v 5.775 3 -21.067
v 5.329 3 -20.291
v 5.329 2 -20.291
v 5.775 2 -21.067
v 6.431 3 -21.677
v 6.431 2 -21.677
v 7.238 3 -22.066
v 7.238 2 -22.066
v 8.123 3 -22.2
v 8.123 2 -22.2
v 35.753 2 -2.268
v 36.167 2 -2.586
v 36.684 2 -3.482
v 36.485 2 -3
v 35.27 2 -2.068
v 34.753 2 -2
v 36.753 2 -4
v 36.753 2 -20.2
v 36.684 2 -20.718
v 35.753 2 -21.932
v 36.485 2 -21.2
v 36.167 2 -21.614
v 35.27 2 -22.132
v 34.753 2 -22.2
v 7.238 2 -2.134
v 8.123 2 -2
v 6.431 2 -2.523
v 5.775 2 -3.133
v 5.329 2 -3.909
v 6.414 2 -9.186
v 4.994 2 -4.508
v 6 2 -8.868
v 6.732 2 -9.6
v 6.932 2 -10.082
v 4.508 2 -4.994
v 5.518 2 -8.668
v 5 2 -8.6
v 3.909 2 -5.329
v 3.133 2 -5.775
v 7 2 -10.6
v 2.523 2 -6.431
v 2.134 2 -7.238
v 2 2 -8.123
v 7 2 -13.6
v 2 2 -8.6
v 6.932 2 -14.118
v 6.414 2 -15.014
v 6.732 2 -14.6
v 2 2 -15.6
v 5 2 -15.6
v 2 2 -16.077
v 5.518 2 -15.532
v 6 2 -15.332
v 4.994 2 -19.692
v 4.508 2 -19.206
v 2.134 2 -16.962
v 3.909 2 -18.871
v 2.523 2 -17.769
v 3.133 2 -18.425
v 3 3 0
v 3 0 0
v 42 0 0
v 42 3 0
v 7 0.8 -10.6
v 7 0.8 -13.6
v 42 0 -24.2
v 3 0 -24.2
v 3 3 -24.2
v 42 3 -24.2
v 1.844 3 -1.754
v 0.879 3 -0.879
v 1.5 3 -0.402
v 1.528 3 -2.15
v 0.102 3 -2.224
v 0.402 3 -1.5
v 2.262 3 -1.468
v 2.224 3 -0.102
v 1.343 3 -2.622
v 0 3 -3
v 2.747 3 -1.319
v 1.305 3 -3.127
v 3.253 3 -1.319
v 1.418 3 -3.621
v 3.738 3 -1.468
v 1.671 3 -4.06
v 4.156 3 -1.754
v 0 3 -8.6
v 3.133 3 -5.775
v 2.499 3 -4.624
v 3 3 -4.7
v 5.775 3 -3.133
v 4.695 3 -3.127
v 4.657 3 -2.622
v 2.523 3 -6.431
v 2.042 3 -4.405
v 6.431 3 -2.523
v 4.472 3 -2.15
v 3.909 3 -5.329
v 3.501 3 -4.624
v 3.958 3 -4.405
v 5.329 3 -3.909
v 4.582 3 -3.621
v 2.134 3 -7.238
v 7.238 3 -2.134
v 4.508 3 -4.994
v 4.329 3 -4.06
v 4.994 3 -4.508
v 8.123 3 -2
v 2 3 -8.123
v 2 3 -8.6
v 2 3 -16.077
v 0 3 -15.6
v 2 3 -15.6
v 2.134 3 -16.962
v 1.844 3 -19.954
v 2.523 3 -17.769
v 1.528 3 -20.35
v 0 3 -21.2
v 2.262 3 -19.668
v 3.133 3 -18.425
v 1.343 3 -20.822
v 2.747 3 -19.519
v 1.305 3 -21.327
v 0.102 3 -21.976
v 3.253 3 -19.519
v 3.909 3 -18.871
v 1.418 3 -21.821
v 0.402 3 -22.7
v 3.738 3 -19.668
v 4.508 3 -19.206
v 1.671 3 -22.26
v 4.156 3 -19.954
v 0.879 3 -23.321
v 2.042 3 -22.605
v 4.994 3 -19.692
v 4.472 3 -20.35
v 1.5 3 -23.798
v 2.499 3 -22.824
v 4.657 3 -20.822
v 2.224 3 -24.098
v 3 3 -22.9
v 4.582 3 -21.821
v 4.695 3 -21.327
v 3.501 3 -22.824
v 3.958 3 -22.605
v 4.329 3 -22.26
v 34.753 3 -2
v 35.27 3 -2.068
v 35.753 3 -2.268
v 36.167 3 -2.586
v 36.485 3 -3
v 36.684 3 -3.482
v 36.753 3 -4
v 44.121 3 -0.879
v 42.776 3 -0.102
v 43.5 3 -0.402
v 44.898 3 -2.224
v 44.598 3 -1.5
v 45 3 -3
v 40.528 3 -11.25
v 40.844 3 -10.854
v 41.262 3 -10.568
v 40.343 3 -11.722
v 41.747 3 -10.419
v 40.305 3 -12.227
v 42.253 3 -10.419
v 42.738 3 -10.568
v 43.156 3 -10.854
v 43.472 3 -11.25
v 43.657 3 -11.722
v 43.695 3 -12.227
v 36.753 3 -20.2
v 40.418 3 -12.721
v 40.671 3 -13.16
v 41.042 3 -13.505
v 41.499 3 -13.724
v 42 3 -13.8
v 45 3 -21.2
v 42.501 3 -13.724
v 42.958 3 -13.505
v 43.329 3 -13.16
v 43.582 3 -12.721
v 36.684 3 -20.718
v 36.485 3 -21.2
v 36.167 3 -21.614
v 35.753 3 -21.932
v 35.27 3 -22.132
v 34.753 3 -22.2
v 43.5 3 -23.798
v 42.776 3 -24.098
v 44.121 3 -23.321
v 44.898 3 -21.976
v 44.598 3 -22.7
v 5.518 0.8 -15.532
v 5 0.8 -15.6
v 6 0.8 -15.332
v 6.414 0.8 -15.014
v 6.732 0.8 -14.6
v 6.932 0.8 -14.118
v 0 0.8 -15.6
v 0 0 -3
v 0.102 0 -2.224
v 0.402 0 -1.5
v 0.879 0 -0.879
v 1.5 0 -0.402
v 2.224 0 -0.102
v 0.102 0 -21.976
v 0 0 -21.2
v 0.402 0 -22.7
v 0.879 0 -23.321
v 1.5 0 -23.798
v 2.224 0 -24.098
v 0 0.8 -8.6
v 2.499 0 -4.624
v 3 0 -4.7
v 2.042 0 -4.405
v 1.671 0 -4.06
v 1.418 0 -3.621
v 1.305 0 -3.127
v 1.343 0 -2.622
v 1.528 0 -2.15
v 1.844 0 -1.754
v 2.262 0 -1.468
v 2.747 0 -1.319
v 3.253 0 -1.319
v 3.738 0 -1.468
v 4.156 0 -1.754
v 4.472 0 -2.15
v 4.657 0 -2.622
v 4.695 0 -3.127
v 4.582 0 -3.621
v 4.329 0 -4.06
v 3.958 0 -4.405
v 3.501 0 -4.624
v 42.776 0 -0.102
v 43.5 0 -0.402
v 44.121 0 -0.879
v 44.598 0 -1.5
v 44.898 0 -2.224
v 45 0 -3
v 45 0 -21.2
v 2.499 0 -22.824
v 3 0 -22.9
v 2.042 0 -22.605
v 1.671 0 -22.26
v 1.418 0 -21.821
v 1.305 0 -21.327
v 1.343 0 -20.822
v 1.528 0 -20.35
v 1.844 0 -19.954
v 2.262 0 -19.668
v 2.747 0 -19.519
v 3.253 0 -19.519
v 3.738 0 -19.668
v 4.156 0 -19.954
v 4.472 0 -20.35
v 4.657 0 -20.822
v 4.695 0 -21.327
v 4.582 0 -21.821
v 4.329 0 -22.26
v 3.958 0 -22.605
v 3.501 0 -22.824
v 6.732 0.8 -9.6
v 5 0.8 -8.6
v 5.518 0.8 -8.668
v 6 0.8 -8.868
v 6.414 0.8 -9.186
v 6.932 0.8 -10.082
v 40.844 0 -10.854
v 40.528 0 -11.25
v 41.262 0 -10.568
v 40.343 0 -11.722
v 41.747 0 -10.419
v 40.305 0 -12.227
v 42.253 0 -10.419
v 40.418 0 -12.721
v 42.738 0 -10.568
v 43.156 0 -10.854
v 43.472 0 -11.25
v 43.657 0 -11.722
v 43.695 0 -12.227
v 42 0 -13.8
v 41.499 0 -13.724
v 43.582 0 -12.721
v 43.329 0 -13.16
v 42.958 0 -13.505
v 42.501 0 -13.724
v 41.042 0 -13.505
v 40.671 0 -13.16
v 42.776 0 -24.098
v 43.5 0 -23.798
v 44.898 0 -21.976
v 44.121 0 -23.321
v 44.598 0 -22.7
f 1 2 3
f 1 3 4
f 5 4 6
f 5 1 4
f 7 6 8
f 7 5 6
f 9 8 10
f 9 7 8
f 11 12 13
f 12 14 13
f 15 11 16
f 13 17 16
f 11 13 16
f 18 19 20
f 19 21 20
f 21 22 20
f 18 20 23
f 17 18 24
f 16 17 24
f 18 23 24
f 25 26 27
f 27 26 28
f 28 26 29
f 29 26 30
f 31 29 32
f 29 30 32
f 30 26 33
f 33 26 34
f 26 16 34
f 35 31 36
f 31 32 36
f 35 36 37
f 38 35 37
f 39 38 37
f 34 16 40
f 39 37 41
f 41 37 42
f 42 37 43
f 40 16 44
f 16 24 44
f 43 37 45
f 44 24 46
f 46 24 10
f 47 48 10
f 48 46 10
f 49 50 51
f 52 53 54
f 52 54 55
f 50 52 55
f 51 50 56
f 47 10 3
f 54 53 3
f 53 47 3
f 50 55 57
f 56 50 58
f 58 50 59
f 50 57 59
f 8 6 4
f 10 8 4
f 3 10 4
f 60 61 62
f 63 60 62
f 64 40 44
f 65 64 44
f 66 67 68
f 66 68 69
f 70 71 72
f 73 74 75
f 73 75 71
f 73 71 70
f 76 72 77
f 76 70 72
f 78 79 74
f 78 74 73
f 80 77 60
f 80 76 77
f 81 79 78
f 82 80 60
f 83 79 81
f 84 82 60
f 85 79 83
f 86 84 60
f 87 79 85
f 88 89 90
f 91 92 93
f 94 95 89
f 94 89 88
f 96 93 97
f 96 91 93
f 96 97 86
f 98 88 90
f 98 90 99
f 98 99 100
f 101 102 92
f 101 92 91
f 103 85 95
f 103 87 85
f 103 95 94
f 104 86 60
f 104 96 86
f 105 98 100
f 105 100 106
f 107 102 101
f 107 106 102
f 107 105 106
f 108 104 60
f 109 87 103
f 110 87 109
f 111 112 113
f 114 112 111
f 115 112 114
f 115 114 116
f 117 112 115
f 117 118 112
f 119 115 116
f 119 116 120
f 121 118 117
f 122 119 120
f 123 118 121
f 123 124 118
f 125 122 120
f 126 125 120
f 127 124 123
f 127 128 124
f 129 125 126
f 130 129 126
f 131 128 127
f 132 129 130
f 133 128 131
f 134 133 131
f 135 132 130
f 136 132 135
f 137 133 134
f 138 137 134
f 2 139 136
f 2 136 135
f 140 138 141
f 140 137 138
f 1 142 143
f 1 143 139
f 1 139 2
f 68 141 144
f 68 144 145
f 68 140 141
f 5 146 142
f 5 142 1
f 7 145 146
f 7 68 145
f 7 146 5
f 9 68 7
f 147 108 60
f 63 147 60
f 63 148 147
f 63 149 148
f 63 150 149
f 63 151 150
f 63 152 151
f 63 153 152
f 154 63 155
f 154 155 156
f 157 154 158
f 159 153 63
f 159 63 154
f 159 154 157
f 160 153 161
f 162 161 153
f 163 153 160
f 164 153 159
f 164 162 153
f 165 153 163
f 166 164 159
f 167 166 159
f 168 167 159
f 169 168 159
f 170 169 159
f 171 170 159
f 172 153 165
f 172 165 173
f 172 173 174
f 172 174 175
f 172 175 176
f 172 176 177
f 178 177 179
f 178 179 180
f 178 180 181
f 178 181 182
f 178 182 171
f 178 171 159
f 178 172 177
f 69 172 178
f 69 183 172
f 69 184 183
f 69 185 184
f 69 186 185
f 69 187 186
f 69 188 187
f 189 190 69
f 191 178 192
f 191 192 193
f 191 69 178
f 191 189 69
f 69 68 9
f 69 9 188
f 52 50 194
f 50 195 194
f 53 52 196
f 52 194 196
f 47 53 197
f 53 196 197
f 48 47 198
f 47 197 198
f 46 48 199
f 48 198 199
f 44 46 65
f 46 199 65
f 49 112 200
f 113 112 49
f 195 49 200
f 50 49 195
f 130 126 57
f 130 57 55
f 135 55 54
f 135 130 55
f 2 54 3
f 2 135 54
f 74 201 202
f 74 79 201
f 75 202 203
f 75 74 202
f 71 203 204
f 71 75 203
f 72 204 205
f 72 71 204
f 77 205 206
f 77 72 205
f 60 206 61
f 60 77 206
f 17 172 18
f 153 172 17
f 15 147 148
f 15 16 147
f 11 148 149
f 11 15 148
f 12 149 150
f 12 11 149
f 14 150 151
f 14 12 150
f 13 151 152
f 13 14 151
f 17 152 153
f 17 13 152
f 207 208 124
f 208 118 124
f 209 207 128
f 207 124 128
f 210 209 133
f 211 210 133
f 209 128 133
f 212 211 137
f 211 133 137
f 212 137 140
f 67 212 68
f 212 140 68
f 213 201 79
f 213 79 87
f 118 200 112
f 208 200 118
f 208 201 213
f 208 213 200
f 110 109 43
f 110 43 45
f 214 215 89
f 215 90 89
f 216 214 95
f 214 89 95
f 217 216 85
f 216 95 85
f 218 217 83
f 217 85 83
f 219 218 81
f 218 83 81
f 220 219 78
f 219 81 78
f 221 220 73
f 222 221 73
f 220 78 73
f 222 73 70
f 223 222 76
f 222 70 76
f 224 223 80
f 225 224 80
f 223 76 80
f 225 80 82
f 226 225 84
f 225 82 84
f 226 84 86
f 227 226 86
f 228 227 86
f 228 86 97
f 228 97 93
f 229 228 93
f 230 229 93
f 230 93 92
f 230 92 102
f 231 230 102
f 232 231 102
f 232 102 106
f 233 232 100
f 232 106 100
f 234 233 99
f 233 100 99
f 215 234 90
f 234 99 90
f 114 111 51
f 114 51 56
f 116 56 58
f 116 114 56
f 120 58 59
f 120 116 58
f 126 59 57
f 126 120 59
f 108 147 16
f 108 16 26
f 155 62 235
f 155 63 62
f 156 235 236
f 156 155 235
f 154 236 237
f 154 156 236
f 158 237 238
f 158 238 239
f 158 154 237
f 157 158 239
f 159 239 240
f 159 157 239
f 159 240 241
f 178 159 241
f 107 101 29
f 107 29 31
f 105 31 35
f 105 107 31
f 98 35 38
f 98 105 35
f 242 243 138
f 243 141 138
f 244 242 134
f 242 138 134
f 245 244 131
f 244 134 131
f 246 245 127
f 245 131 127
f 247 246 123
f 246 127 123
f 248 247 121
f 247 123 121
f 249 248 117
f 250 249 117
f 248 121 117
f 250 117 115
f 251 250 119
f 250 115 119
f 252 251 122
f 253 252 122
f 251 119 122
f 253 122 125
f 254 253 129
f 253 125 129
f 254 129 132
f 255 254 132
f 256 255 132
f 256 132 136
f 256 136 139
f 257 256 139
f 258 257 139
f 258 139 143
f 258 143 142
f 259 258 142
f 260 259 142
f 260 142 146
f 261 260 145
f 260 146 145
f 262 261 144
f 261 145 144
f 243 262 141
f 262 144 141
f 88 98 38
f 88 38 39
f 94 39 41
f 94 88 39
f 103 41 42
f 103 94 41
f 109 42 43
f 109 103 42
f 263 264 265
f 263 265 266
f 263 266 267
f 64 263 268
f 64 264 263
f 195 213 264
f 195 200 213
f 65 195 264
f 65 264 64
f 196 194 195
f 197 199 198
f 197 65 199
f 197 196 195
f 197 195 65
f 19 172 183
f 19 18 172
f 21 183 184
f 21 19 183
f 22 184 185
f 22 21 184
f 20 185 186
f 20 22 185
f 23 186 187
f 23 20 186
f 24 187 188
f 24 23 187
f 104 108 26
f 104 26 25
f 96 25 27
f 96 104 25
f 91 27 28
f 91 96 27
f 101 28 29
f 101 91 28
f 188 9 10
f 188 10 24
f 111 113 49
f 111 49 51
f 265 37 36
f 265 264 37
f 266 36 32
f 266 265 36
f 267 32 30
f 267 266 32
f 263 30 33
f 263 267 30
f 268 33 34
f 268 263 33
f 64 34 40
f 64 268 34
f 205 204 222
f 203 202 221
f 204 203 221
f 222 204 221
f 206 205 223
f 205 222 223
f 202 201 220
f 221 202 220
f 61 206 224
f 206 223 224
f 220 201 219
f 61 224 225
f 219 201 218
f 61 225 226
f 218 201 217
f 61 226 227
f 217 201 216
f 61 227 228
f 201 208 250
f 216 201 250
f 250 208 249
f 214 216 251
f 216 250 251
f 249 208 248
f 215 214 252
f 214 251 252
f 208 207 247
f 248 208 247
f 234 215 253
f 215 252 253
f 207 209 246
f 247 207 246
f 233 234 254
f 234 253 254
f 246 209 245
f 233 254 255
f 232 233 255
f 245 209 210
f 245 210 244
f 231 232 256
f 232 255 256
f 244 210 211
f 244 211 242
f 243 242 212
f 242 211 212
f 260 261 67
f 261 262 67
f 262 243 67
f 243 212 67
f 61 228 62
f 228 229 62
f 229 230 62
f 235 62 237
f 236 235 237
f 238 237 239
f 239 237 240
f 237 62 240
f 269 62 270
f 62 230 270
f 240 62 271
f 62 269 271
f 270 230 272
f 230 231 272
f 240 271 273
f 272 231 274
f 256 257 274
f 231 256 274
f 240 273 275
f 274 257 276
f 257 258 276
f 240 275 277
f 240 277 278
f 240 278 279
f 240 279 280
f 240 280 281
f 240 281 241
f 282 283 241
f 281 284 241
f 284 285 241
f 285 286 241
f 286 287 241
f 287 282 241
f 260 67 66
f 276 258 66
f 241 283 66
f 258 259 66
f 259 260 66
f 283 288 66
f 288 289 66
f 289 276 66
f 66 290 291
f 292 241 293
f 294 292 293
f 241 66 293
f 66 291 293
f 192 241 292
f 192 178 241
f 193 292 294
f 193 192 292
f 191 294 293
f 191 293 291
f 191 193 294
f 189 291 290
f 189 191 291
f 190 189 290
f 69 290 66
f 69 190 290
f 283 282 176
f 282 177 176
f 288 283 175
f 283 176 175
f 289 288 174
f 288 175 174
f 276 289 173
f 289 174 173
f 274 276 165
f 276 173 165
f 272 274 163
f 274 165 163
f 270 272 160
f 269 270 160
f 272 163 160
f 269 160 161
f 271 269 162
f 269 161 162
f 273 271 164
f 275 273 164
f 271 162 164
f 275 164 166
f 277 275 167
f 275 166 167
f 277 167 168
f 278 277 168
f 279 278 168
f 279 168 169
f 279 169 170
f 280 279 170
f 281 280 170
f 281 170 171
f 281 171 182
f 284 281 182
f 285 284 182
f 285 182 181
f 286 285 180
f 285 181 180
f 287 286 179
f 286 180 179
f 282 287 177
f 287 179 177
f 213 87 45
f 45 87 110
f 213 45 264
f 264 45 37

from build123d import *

# Parameters (mm, degrees)
SKETCH_1_W            = 45
SKETCH_1_H            = 24.2
EXTRUDE_1_DEPTH       = 3
FILLET_1_R            = 3
HOLE_WIZARD_M31_D     = 3.4
HOLE_WIZARD_M31_DEPTH = 3
HOLE_WIZARD_M31_TIP   = 1.021463052
CUT_EXTRUDE_1_DEPTH   = 1
FILLET_2_R            = 2
SKETCH_3_W            = 7
SKETCH_3_H            = 7
CUT_EXTRUDE_2_DEPTH   = 2.2
FILLET_3_R            = 2


with BuildPart() as part:
    # Эскиз1 → Бобышка-Вытянуть1 (new body)
    with BuildSketch(Plane(origin=(0, 0, 0), x_dir=(1, 0, 0), z_dir=(0, 1, 0))):
        with Locations((22.5, 12.1)):
            Rectangle(SKETCH_1_W, SKETCH_1_H)
    extrude(amount=EXTRUDE_1_DEPTH)

    # Скругление1
    fillet_1_edges = [part.edges().sort_by_distance(p)[0] for p in [
        (0, 1.5, -24.2),
        (45, 1.5, -24.2),
        (45, 1.5, 0),
        (0, 1.5, 0),
    ]]
    fillet(fillet_1_edges, radius=FILLET_1_R)

    # Отверстие с зазором M31
    with Locations(Plane(origin=(69.423819873, 0, -24.090135757), x_dir=(0, 0, 1), z_dir=(0, -1, 0))):
        with Locations((2.890135757, 66.423819873), (21.090135757, 66.423819873), (11.990135757, 27.423819873)):
            Hole(HOLE_WIZARD_M31_D / 2, depth=HOLE_WIZARD_M31_DEPTH)
            with Locations((0, 0, -(HOLE_WIZARD_M31_DEPTH + HOLE_WIZARD_M31_TIP / 2))):  # 118° drill point
                Cone(0, HOLE_WIZARD_M31_D / 2, HOLE_WIZARD_M31_TIP, mode=Mode.SUBTRACT)

    # Эскиз7 → Вырез-Вытянуть1 (cut)
    with BuildSketch(Plane(origin=(0, 3, 0), x_dir=(1, 0, 0), z_dir=(0, 1, 0))):
        with BuildLine():
            Line((2, 8.123475383), (2, 16.076524617))
            ThreePointArc((2, 16.076524617), (2.522831528, 17.768752841), (3.909090909, 18.871147553))
            ThreePointArc((3.909090909, 18.871147553), (4.767766953, 19.432233047), (5.328852447, 20.290909091))
            ThreePointArc((5.328852447, 20.290909091), (6.431247159, 21.677168472), (8.123475383, 22.2))
            Line((8.123475383, 22.2), (36.752647357, 22.2))
            Line((36.752647357, 22.2), (36.752647357, 2))
            Line((36.752647357, 2), (8.123475383, 2))
            ThreePointArc((8.123475383, 2), (6.431247159, 2.522831528), (5.328852447, 3.909090909))
            ThreePointArc((5.328852447, 3.909090909), (4.767766953, 4.767766953), (3.909090909, 5.328852447))
            ThreePointArc((3.909090909, 5.328852447), (2.522831528, 6.431247159), (2, 8.123475383))
        make_face()
    extrude(amount=-CUT_EXTRUDE_1_DEPTH, mode=Mode.SUBTRACT)

    # Скругление2
    fillet_2_edges = [part.edges().sort_by_distance(p)[0] for p in [
        (36.752647357, 2.5, -22.2),
        (36.752647357, 2.5, -2),
    ]]
    fillet(fillet_2_edges, radius=FILLET_2_R)

    # Эскиз3 → Вырез-Вытянуть2 (cut)
    with BuildSketch(Plane(origin=(0, 3, 0), x_dir=(1, 0, 0), z_dir=(0, 1, 0))):
        with Locations((3.5, 12.1)):
            Rectangle(SKETCH_3_W, SKETCH_3_H)
    extrude(amount=-CUT_EXTRUDE_2_DEPTH, mode=Mode.SUBTRACT)

    # Скругление3
    fillet_3_edges = [part.edges().sort_by_distance(p)[0] for p in [
        (7, 1.4, -8.6),
        (7, 1.4, -15.6),
    ]]
    fillet(fillet_3_edges, radius=FILLET_3_R)


solid = part.part
